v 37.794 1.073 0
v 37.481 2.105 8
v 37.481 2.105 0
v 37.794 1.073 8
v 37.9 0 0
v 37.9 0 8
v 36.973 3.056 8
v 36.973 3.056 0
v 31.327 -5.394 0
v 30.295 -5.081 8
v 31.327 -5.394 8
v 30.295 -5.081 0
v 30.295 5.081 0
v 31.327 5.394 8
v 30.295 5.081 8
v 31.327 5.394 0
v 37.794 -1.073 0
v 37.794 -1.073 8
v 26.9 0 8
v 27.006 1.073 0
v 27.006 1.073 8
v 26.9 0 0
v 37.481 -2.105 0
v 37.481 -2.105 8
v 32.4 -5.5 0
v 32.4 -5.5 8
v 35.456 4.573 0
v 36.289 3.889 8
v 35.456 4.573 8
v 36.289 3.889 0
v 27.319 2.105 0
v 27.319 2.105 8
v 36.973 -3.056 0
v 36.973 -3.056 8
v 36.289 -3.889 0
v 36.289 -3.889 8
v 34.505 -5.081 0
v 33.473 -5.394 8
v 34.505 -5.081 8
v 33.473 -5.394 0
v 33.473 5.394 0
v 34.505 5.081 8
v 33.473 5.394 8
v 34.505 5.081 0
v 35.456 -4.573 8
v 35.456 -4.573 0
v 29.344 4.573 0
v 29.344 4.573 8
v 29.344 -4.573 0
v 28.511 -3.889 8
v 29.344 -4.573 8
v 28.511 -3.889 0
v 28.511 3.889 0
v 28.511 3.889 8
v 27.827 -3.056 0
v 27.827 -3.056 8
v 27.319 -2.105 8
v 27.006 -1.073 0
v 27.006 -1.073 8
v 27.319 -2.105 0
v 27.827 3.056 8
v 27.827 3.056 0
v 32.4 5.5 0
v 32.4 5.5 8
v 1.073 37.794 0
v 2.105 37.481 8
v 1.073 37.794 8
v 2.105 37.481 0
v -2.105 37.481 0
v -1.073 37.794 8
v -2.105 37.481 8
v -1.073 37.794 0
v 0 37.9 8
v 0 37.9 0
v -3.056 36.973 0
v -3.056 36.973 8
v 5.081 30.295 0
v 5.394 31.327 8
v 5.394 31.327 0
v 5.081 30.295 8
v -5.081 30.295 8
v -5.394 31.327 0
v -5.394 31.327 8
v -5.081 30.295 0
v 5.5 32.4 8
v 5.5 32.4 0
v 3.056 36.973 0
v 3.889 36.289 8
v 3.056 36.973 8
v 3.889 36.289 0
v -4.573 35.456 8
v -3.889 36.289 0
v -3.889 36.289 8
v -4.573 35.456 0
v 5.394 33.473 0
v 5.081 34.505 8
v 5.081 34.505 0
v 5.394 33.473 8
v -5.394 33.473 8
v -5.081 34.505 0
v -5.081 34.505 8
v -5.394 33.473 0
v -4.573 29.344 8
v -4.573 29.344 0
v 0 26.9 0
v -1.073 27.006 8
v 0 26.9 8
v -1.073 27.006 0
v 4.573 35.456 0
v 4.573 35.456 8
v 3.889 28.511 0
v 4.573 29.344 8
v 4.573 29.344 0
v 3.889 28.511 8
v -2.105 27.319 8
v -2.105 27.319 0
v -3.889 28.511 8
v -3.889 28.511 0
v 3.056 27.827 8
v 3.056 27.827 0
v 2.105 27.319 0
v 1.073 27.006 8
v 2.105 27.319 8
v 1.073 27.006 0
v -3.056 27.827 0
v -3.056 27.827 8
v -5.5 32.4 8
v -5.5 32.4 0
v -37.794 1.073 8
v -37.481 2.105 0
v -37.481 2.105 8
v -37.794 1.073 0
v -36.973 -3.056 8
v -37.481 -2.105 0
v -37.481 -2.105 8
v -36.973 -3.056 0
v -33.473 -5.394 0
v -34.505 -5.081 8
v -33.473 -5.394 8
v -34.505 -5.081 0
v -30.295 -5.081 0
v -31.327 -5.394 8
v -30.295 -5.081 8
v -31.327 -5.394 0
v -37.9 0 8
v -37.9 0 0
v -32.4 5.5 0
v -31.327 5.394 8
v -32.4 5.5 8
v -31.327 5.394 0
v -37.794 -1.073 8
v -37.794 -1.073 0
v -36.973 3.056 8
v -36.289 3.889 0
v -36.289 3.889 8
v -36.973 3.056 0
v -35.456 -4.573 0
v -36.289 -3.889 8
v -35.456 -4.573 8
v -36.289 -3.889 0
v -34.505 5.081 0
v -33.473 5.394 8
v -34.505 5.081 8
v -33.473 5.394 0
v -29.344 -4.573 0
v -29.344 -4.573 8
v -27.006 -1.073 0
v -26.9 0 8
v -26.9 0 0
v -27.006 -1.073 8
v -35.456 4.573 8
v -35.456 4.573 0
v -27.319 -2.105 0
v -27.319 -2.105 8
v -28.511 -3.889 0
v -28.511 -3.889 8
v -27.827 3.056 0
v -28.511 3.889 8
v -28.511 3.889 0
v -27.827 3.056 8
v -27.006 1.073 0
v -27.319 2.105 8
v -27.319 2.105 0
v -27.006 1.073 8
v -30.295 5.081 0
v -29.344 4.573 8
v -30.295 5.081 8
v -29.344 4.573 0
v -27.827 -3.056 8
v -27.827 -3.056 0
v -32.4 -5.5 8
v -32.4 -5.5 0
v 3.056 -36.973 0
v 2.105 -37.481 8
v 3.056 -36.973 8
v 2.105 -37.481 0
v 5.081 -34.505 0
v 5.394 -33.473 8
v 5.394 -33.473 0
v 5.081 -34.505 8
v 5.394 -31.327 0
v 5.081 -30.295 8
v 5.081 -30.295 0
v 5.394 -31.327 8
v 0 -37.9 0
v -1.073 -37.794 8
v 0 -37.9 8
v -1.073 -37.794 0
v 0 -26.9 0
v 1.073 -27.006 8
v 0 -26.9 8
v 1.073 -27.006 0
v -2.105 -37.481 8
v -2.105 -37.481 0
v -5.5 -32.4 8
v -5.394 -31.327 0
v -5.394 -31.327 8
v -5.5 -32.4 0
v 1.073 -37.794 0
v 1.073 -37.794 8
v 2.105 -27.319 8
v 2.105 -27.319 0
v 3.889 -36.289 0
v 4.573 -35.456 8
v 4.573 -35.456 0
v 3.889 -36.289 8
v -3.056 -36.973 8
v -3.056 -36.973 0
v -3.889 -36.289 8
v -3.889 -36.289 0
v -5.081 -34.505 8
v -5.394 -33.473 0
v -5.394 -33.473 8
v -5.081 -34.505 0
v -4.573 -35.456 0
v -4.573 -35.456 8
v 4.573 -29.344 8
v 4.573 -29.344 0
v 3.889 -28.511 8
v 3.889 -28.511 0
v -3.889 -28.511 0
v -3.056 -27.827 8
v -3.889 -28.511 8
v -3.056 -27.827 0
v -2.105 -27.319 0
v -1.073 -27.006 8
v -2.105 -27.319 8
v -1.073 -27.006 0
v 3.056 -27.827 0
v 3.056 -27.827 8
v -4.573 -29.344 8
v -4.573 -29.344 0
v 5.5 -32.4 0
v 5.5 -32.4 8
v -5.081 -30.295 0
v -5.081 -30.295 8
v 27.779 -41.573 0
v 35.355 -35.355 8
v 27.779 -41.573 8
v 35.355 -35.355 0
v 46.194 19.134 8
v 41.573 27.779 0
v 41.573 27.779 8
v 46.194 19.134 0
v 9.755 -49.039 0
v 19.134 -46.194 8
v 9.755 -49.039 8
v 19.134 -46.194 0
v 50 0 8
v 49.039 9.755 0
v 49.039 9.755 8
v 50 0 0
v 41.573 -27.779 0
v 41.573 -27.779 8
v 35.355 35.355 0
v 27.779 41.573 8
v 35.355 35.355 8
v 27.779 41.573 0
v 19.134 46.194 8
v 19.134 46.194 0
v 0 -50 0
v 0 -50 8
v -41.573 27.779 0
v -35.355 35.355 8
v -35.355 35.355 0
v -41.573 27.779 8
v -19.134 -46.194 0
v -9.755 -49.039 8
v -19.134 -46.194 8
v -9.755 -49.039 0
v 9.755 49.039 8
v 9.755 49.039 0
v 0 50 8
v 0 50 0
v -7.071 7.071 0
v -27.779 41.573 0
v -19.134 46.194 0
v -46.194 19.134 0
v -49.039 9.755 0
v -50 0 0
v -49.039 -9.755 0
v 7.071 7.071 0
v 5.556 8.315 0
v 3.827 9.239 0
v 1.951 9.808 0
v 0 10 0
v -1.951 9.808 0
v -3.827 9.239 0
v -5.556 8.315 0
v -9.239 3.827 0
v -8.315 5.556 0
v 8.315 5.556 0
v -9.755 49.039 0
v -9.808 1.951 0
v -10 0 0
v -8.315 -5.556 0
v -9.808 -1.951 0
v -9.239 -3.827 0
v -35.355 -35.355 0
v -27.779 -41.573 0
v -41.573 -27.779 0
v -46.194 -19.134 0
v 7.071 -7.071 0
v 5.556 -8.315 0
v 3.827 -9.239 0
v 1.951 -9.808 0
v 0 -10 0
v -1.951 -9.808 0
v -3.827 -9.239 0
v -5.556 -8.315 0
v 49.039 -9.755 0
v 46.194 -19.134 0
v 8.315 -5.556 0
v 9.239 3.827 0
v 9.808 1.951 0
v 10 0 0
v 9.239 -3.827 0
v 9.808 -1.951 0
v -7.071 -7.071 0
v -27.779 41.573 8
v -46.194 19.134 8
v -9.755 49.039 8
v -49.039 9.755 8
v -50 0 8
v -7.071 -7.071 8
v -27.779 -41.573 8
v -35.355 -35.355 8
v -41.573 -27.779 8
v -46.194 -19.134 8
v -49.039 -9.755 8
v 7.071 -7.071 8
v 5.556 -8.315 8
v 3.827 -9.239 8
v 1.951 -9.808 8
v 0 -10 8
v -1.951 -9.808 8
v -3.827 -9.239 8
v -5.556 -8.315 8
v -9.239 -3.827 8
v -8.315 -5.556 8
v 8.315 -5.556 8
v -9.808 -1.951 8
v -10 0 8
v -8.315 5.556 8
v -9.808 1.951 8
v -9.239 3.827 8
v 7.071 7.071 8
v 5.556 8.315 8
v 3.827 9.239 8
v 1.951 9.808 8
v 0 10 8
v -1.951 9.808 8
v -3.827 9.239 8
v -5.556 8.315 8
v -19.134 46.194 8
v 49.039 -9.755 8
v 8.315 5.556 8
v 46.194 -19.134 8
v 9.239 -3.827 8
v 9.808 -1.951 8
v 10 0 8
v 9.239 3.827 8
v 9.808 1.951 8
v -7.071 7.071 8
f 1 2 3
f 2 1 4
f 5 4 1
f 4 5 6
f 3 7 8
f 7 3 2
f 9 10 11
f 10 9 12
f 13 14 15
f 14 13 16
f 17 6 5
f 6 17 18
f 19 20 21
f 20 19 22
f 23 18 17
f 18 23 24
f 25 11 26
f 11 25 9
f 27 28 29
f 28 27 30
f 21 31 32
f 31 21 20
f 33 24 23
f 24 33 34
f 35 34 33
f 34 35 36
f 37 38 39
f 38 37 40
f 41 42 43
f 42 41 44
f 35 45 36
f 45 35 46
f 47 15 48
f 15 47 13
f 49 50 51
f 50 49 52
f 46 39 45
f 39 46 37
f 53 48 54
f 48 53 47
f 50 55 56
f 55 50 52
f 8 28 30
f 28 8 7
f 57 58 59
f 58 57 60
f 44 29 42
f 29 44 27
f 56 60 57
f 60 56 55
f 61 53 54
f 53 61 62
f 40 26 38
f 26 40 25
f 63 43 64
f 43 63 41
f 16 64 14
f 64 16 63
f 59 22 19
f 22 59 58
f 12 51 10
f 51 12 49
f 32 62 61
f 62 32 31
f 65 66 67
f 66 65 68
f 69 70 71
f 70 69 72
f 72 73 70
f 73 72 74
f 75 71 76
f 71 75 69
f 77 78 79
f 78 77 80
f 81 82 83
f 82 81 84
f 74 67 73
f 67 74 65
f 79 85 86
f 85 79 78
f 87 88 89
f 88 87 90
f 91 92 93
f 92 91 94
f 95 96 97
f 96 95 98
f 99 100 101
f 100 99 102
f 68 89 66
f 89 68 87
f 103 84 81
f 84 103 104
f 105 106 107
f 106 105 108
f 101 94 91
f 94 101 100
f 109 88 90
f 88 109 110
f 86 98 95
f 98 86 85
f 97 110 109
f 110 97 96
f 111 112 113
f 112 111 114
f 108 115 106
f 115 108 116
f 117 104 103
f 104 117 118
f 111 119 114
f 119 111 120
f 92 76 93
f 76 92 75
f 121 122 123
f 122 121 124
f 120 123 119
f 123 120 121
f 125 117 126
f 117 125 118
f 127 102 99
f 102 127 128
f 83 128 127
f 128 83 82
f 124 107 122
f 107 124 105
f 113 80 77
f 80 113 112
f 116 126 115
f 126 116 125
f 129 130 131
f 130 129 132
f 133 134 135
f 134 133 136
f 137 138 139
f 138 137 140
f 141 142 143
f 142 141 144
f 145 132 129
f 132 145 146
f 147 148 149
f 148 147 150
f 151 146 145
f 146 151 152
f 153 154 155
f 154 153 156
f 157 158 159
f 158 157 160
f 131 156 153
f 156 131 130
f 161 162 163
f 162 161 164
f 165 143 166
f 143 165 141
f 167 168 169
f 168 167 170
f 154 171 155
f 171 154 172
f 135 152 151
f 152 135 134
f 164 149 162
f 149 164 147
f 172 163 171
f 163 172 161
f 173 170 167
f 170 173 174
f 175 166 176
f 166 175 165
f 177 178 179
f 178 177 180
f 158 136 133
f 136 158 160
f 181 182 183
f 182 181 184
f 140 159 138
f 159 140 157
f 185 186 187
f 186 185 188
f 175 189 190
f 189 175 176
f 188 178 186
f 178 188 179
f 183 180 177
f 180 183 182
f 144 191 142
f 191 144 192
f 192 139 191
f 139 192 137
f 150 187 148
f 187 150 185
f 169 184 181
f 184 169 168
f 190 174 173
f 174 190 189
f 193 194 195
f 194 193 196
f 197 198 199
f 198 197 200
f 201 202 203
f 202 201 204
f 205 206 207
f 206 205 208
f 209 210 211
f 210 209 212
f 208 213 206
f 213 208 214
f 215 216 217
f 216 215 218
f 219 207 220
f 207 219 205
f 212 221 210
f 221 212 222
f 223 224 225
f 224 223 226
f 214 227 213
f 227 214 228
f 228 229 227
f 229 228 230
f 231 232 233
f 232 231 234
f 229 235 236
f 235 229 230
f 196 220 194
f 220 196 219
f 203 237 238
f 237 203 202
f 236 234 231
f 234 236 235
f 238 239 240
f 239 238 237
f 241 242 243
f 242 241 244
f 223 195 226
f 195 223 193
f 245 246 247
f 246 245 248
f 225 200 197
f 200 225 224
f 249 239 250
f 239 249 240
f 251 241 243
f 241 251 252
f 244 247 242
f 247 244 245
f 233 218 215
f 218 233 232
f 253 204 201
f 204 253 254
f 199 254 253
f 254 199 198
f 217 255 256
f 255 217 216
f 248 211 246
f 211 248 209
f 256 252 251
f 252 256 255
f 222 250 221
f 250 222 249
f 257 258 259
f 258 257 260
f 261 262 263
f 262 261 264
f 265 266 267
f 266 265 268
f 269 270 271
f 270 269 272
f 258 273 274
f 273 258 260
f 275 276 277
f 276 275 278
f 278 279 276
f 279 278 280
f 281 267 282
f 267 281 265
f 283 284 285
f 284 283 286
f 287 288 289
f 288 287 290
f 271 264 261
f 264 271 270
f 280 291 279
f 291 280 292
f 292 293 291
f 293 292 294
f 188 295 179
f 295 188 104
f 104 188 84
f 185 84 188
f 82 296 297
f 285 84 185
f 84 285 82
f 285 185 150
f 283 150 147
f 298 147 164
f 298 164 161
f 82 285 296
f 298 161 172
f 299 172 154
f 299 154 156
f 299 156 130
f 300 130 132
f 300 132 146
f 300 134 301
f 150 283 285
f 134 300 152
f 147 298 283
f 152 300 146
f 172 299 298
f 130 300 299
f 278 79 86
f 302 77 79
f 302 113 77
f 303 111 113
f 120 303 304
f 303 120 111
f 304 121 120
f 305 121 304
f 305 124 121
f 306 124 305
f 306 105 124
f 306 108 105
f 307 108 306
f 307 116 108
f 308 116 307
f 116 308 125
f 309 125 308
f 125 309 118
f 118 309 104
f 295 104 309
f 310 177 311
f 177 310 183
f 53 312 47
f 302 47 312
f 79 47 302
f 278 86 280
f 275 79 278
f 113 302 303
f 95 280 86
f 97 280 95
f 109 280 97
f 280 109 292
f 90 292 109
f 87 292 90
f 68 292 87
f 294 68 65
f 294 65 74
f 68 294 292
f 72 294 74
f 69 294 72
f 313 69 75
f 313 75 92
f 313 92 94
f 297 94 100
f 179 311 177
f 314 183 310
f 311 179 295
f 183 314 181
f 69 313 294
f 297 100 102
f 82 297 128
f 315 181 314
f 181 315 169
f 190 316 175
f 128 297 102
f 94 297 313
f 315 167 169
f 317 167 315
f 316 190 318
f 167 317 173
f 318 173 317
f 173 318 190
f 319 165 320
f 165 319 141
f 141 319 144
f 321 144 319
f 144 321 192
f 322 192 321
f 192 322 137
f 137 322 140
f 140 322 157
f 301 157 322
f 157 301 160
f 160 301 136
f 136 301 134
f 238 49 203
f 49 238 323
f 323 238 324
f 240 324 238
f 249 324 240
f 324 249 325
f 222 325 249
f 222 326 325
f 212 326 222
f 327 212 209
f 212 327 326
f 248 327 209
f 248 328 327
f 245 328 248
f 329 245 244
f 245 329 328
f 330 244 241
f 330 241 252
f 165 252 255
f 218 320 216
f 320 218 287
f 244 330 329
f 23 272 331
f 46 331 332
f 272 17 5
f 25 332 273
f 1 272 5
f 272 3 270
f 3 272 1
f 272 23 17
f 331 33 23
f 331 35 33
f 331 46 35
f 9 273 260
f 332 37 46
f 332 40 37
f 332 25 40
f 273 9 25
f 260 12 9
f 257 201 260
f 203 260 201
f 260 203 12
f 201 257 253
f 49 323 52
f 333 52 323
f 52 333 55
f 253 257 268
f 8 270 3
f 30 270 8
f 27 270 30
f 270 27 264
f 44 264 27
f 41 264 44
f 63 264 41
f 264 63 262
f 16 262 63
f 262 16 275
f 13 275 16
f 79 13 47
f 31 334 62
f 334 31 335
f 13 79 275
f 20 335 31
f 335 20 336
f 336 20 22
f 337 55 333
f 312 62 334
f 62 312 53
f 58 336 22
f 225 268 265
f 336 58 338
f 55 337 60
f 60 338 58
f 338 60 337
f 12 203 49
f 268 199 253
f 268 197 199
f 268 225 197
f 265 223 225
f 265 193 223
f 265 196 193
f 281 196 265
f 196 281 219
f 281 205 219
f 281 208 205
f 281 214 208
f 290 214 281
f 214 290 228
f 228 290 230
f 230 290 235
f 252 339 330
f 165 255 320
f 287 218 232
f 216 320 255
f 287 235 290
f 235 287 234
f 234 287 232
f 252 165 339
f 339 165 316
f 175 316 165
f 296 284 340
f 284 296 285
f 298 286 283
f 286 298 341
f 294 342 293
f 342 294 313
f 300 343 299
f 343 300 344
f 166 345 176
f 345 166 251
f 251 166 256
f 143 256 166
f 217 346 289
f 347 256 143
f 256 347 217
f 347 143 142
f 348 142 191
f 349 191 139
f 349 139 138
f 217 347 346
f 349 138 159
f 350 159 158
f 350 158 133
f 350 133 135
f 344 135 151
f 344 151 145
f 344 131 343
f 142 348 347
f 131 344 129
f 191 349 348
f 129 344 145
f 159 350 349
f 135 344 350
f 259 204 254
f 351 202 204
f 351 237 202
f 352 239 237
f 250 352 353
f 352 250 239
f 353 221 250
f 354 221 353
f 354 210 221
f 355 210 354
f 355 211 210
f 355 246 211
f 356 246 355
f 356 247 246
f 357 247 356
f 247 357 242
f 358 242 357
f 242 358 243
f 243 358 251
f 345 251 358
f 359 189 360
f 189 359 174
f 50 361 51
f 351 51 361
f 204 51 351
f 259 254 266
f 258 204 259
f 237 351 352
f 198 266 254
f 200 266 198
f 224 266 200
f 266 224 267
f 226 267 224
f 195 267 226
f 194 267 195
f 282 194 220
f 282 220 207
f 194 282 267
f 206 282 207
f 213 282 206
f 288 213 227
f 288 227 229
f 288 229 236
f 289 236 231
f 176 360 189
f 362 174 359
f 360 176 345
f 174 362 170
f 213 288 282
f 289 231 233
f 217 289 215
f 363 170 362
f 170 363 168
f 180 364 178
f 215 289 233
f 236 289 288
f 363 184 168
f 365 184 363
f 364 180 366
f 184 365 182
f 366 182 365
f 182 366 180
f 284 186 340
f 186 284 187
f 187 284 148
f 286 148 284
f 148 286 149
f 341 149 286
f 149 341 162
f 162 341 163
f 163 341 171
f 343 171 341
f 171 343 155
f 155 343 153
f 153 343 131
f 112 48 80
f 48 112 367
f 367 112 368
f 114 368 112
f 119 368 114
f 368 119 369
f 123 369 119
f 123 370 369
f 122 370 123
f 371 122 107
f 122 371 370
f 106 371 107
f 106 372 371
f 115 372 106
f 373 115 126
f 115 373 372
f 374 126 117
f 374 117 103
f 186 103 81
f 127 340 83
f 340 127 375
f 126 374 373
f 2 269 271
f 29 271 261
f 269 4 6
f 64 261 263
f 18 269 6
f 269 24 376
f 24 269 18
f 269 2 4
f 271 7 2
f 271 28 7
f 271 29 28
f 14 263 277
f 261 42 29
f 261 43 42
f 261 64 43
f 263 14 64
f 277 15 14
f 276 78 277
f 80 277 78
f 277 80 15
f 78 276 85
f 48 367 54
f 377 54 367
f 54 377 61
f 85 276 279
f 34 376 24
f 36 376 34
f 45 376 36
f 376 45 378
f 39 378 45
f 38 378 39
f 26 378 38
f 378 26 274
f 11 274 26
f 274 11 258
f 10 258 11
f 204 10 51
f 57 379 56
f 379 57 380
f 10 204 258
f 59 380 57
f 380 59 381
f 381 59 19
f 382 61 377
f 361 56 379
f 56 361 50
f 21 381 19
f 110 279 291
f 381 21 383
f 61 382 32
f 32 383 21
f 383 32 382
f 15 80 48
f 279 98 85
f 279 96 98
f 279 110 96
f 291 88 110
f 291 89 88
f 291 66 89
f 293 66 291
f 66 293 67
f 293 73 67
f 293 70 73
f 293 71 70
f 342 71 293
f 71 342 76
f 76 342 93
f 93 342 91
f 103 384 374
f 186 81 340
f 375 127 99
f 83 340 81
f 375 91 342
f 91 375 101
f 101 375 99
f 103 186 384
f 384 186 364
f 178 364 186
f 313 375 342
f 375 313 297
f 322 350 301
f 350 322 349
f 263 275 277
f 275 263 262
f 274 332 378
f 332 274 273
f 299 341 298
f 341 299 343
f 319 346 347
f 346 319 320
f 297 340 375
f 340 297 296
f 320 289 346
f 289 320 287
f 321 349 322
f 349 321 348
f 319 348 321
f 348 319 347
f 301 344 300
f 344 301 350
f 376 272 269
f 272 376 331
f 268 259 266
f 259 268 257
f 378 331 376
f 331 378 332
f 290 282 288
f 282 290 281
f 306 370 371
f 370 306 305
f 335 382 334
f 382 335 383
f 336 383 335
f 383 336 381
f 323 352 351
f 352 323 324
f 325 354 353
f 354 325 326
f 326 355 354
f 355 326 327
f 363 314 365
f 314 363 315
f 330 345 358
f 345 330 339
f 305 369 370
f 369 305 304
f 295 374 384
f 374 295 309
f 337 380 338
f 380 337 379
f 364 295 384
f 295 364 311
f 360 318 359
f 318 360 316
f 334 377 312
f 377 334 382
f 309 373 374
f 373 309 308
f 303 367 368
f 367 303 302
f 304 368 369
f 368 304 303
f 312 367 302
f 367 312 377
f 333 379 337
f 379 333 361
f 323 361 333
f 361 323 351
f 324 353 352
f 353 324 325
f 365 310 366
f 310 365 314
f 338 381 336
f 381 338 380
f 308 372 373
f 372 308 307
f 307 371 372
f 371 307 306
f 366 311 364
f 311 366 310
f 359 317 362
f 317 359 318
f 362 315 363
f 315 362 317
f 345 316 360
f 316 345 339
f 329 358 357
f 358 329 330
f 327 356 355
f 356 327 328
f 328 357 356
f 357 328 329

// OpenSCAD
$fn = 32;

// ----------------------------------------------------------------------
// Bolt-circle flange: 100 mm outside, 4 bolt holes, bore 20 mm
// ----------------------------------------------------------------------

// --- parameters (mm) ---
flange_d = 100;           // flange outside diameter
flange_t = 8;             // flange thickness
bolts = 4;                // number of bolt holes
bolt_d = 11;              // bolt clearance
bolt_r = 32.4;            // bolt circle radius
bore_d = 20;              // centre bore

module body() {
  cylinder(h = flange_t, d = flange_d);
}

difference() {
  body();
  /* bolt circle */
  for (i = [0 : bolts - 1]) rotate([0, 0, i * 360 / bolts]) translate([bolt_r, 0, -1]) cylinder(h = flange_t + 3, d = bolt_d);
  translate([0, 0, -1]) cylinder(h = flange_t + 3, d = bore_d);
}
